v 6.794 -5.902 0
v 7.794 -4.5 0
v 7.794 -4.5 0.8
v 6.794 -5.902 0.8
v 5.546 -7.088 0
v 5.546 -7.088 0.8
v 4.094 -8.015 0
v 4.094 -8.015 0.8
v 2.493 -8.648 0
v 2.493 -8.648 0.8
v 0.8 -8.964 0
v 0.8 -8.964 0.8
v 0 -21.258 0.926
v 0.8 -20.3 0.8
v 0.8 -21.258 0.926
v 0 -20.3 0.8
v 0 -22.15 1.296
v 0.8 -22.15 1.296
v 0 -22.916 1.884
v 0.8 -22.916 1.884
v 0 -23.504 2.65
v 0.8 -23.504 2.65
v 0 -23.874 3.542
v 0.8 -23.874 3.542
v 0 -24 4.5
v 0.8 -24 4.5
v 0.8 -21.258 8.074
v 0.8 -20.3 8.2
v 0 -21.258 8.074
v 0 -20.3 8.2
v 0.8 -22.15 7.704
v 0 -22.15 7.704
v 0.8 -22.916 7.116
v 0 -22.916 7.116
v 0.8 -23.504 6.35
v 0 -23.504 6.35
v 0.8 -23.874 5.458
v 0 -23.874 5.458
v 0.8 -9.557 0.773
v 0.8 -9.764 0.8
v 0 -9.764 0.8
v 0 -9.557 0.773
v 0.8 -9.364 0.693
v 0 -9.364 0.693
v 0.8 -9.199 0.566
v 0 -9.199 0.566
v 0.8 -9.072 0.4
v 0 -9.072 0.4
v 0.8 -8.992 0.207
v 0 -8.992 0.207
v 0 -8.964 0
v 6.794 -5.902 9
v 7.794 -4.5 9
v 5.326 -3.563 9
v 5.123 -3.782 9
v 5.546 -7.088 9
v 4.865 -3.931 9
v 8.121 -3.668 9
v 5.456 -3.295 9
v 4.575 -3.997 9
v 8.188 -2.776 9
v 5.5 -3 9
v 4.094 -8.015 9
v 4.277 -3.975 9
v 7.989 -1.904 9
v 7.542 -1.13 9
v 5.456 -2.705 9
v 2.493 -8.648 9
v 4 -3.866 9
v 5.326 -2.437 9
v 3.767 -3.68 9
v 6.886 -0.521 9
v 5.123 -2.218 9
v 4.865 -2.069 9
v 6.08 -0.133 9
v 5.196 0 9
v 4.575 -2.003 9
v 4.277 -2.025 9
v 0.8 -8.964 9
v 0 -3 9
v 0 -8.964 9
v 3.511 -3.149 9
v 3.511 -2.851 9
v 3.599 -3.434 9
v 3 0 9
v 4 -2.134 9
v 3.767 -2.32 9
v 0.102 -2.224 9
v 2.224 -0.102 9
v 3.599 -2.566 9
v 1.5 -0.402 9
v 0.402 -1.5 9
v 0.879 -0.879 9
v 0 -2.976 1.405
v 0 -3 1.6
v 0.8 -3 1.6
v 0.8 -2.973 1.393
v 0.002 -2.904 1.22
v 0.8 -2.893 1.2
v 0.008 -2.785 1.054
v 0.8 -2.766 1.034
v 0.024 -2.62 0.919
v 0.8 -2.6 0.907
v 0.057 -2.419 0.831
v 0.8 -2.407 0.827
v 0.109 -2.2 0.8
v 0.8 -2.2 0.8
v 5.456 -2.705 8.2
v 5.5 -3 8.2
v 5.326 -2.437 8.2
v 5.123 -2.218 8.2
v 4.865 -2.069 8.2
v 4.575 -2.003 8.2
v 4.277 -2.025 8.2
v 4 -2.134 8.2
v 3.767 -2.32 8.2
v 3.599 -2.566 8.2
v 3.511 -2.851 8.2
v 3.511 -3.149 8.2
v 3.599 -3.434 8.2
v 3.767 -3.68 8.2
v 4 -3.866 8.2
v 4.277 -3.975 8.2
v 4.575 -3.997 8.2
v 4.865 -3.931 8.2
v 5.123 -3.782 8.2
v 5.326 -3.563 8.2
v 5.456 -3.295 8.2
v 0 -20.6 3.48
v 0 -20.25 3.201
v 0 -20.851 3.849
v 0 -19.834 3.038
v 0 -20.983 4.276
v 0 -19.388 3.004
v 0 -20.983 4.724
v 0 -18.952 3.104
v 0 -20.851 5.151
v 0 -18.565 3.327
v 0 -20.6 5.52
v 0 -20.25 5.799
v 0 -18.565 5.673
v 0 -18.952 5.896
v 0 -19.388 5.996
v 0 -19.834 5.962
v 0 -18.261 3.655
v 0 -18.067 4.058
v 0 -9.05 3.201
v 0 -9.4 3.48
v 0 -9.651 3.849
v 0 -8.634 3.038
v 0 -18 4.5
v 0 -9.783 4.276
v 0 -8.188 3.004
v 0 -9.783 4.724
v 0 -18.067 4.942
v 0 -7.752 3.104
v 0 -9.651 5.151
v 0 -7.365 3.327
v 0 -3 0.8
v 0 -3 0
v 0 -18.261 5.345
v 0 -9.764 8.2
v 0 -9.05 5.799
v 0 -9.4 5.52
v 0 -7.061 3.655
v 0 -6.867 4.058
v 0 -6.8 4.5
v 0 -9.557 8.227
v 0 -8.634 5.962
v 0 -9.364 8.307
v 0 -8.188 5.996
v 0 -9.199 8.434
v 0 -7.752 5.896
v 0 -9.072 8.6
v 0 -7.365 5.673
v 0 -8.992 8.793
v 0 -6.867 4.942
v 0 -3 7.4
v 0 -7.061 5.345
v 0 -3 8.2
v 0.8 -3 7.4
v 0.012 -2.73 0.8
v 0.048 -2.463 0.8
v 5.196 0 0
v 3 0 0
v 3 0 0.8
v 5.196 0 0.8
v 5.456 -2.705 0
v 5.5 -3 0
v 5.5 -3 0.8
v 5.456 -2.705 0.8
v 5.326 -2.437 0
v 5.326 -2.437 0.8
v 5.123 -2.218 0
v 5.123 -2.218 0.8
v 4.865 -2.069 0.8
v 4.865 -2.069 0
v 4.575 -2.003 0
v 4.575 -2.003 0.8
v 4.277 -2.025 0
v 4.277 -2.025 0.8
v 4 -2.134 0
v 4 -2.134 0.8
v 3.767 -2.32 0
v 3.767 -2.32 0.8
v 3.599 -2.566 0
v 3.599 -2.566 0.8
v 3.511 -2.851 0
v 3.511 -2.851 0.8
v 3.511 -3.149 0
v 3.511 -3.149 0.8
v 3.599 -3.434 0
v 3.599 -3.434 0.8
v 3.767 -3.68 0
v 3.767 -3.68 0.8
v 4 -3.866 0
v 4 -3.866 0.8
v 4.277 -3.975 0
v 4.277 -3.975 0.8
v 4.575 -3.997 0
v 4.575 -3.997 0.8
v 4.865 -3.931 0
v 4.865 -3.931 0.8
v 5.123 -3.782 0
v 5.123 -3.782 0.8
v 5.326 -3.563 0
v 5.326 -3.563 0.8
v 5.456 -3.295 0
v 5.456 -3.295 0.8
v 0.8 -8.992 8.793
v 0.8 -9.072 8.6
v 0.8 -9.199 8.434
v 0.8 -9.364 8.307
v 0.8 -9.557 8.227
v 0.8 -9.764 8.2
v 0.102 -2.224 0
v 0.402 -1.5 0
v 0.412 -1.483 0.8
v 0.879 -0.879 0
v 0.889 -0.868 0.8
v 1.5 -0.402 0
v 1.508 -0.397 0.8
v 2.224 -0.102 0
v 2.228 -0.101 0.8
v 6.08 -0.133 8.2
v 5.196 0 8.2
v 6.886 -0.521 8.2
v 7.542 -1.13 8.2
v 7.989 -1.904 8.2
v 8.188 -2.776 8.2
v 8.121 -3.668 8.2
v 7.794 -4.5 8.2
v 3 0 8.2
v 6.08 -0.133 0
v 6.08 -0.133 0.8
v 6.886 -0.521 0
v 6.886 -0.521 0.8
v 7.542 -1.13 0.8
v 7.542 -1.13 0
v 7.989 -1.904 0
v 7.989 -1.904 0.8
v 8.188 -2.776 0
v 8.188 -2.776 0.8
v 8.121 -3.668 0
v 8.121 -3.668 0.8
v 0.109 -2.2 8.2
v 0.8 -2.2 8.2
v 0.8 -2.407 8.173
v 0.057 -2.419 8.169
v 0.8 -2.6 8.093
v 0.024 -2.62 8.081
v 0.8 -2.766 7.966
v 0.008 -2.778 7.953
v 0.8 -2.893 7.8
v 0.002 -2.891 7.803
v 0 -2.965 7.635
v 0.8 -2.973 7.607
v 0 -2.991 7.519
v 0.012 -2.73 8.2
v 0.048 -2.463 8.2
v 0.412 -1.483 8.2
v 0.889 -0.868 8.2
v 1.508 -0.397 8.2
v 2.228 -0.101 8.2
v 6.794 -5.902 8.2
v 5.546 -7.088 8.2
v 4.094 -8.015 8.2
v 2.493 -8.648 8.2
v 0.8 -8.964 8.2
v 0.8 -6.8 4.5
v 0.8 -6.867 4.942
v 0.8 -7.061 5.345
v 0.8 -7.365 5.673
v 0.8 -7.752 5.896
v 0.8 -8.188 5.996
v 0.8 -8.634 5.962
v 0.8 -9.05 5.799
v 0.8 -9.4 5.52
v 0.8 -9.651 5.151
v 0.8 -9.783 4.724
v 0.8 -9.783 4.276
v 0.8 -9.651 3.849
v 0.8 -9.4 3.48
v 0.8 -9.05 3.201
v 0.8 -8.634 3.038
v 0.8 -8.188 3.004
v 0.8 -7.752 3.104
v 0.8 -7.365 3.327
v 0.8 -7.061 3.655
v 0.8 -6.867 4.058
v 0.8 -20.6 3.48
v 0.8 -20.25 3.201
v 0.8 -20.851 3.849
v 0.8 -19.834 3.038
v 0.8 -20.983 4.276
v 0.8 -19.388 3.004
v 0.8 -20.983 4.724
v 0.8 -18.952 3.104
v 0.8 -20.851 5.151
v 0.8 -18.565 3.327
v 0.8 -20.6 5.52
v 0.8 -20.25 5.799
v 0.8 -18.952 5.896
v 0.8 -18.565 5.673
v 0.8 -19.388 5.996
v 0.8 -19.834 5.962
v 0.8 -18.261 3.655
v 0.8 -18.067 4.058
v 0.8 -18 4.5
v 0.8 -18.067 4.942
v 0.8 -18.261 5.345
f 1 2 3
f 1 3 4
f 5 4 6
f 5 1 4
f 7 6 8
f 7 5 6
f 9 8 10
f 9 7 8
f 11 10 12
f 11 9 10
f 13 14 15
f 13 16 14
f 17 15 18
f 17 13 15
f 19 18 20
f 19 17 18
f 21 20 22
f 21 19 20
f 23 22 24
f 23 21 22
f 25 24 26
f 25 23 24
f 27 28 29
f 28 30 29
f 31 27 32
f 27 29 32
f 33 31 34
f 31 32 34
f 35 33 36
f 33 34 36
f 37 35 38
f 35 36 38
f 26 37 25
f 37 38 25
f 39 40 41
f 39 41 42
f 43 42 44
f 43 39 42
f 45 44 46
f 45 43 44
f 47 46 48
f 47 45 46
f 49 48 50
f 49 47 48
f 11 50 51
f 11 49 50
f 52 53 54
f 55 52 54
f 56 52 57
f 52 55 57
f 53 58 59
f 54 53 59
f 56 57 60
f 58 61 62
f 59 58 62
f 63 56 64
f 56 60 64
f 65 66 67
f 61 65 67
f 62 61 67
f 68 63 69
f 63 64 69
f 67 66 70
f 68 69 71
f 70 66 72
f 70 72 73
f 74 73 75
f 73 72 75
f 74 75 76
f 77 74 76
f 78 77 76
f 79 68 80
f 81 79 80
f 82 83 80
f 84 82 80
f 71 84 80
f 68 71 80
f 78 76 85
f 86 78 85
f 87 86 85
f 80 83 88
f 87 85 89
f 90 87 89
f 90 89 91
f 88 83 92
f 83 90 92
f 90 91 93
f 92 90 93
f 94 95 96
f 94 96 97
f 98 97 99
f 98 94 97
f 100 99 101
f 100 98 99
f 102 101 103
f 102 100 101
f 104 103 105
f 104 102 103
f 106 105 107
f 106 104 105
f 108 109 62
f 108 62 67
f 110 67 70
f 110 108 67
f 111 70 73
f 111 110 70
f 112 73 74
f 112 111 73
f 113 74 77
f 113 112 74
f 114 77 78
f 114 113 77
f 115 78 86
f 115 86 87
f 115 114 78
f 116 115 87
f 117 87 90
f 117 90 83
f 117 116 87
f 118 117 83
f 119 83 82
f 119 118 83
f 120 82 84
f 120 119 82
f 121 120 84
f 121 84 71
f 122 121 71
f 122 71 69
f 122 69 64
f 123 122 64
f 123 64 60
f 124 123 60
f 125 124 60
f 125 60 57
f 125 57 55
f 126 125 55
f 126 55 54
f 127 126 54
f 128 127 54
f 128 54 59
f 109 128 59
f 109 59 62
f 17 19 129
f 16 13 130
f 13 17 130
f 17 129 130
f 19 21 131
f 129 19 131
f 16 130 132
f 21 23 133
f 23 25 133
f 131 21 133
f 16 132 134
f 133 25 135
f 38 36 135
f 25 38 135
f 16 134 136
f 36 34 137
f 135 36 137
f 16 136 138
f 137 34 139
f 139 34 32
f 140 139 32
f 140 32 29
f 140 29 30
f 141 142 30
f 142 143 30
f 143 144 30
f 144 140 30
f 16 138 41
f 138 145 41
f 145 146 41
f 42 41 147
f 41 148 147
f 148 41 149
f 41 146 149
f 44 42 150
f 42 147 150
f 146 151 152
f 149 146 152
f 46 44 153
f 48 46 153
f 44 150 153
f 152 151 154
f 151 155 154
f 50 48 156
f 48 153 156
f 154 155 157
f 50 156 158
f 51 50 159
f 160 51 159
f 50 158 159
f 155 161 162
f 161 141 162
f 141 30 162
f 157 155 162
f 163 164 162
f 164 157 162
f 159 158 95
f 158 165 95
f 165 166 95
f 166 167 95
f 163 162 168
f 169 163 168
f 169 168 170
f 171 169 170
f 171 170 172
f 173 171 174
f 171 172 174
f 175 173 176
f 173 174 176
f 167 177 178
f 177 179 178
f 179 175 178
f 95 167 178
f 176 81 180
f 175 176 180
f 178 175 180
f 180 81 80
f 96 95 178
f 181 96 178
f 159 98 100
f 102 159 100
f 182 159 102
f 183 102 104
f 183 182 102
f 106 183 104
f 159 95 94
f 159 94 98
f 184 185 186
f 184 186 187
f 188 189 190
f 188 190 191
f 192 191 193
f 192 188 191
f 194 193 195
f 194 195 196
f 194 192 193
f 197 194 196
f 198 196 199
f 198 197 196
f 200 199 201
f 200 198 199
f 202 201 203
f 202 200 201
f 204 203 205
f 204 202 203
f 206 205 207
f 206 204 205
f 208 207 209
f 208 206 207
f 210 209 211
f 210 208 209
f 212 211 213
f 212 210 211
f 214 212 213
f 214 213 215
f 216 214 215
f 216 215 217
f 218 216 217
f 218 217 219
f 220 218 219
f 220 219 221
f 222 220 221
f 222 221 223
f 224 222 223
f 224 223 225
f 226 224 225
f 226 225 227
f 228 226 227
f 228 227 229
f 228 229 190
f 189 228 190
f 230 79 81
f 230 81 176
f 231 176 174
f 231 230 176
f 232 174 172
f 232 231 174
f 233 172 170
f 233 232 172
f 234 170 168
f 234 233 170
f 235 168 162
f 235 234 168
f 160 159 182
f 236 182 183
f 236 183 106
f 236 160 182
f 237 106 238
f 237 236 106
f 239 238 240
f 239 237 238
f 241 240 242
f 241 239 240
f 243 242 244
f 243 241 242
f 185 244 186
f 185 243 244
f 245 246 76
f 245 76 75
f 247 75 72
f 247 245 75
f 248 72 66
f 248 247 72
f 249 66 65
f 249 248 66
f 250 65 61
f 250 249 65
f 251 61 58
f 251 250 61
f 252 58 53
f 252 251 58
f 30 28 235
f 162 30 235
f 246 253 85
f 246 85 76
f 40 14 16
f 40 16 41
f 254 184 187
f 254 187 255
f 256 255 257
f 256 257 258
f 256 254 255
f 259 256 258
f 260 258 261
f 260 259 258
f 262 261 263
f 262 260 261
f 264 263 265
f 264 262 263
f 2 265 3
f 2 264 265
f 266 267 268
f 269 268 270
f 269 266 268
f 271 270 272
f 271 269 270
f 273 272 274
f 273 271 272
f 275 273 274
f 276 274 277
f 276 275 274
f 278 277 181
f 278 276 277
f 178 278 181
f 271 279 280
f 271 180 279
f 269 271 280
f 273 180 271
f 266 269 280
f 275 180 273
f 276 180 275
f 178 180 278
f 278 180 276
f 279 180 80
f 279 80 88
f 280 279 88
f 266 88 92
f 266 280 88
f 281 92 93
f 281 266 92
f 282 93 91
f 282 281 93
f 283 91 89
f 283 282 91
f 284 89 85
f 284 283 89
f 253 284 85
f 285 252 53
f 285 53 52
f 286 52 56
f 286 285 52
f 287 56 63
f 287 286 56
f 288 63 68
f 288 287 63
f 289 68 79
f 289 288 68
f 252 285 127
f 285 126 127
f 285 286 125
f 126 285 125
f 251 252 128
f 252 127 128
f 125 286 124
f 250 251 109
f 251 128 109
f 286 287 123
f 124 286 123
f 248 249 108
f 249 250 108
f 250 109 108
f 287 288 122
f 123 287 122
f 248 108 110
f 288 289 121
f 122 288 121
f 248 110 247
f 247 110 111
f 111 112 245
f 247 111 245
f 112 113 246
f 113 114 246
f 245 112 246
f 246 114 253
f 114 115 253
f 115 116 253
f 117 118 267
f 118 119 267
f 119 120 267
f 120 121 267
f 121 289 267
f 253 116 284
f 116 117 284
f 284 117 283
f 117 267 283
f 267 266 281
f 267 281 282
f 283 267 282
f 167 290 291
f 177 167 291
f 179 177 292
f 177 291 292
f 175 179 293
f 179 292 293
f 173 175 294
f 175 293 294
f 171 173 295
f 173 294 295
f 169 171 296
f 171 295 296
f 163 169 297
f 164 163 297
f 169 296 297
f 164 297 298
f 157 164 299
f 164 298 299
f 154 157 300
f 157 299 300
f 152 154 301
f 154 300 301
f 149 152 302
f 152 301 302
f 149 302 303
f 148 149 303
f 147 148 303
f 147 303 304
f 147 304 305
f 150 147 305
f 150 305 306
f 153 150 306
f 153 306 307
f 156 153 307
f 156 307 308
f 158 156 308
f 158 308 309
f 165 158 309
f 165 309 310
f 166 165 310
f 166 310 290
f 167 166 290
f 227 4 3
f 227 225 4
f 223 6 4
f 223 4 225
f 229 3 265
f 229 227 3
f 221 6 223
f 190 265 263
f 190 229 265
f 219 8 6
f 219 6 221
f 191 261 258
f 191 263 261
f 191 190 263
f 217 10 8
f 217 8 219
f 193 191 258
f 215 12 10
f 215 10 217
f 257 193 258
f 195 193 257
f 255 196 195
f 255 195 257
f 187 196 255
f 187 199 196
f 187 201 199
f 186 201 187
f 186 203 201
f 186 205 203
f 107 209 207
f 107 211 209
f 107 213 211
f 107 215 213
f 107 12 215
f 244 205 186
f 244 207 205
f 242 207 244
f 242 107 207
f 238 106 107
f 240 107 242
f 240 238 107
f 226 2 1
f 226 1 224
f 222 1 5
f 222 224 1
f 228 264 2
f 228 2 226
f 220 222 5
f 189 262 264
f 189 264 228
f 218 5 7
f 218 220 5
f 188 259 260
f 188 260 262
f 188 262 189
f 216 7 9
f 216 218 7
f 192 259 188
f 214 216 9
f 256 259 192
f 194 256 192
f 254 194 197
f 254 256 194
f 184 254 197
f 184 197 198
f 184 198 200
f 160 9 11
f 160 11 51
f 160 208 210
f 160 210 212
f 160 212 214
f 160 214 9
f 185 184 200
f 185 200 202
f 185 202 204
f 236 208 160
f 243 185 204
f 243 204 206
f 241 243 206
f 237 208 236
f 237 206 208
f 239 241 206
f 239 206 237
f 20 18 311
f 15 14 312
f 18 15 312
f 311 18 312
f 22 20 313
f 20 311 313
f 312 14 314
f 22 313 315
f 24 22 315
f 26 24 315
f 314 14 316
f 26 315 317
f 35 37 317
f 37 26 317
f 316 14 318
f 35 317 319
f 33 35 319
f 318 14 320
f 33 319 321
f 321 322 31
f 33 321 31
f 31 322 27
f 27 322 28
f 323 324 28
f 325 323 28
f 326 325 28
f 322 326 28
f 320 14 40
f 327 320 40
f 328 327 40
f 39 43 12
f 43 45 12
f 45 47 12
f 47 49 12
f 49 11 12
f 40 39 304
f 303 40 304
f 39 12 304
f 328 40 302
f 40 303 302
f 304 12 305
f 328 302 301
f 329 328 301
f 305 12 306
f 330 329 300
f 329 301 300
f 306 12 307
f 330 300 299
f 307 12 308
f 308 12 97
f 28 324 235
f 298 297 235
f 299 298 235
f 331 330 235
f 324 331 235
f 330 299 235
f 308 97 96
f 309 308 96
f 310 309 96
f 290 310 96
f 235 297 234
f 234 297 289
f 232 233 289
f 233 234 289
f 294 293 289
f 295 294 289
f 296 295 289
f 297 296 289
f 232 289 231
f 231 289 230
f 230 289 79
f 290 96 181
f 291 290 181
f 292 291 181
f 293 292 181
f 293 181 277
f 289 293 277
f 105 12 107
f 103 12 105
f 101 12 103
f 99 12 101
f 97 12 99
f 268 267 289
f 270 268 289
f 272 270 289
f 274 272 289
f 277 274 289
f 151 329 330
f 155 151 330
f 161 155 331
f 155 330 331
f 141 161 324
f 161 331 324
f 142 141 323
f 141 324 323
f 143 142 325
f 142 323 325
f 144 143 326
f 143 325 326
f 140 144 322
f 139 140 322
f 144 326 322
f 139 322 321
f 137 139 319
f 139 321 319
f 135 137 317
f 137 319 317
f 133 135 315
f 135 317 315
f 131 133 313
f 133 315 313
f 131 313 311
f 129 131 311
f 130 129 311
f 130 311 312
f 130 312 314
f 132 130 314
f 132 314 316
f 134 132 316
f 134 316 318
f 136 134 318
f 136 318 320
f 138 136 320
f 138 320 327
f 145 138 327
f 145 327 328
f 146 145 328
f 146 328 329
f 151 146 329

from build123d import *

# Parameters (mm, degrees)
SKETCH_1_R          = 1
EXTRUDE_1_DEPTH     = 9
SKETCH_2_W          = 7.4
SKETCH_2_H          = 10
CUT_EXTRUDE_1_DEPTH = 9
SKETCH_3_W          = 0.8
SKETCH_3_H          = 15.035626068
CUT_EXTRUDE_2_DEPTH = 9
FILLET_2_R          = 3.7
SKETCH_4_W          = 7.4
SKETCH_4_H          = 2.039607805
CUT_EXTRUDE_3_DEPTH = 9
SKETCH_5_R          = 1.5
CUT_EXTRUDE_4_DEPTH = 9
FILLET_3_R          = 0.8


# Some blends are built 0.0001 mm under size
with BuildPart() as part:
    # 草图1 → 凸台-拉伸1 (new body)
    with BuildSketch(Plane.XY):
        with BuildLine():
            Line((3, 0), (5.196152423, 0))
            ThreePointArc((5.196152423, 0), (7.794228634, -1.5), (7.794228634, -4.5))
            ThreePointArc((7.794228634, -4.5), (4.842298019, -7.586313327), (0.8, -8.964373932))
            Line((0.8, -8.964373932), (0.8, -24))
            Line((0.8, -24), (0, -24))
            Line((0, -24), (0, -3))
            ThreePointArc((0, -3), (0.878679656, -0.878679656), (3, 0))
        make_face()
        with Locations((4.5, -3)):
            Circle(SKETCH_1_R, mode=Mode.SUBTRACT)
    extrude(amount=EXTRUDE_1_DEPTH)

    # 草图2 → 切除-拉伸1 (cut)
    with BuildSketch(Plane(origin=(0.8, 0, 0), x_dir=(0, 0, -1), z_dir=(1, 0, 0))):
        with Locations((-4.5, -3.964373932)):
            Rectangle(SKETCH_2_W, SKETCH_2_H)
    extrude(amount=CUT_EXTRUDE_1_DEPTH, mode=Mode.SUBTRACT)

    # 草图3 → 切除-拉伸2 (cut)
    with BuildSketch(Plane(origin=(0.8, 0, 0), x_dir=(0, 0, -1), z_dir=(1, 0, 0))):
        with Locations((-8.6, -16.482186966)):
            Rectangle(SKETCH_3_W, SKETCH_3_H)
        with Locations((-0.4, -16.482186966)):
            Rectangle(SKETCH_3_W, SKETCH_3_H)
    extrude(amount=-CUT_EXTRUDE_2_DEPTH, mode=Mode.SUBTRACT)

    # 圆角2
    fillet_2_edges = [part.edges().sort_by_distance(p)[0] for p in [
        (0.4, -24, 0.8),
        (0.4, -24, 8.2),
    ]]
    fillet(fillet_2_edges, radius=FILLET_2_R - 0.0001)  # a hair under: the kernel refuses the full size

    # 草图4 → 切除-拉伸3 (cut)
    with BuildSketch(Plane.ZY):
        with Locations((4.5, -1.980196097)):
            Rectangle(SKETCH_4_W, SKETCH_4_H)
    extrude(amount=-CUT_EXTRUDE_3_DEPTH, mode=Mode.SUBTRACT)

    # 草图5 → 切除-拉伸4 (cut)
    with BuildSketch(Plane(origin=(0.8, 0, 0), x_dir=(0, 0, -1), z_dir=(1, 0, 0))):
        with Locations(Location((-4.5, -8.3, 0), (0, 0, 90))):
            Circle(SKETCH_5_R)
        with Locations(Location((-4.5, -19.5, 0), (0, 0, 90))):
            Circle(SKETCH_5_R)
    extrude(amount=-CUT_EXTRUDE_4_DEPTH, mode=Mode.SUBTRACT)

    # 圆角3
    # the kernel refuses this fillet: 0.8 mm, written as the material it adds along each edge
    with BuildSketch(Plane(origin=(0.8, -8.964373932, 0.8), x_dir=(0, -1, 0), z_dir=(-1, 0, 0))) as fillet_3_piece_1:
        with BuildLine():
            CenterArc((FILLET_3_R, -FILLET_3_R), FILLET_3_R, 90, 90)
            Line((0, -FILLET_3_R), (0, 0))
            Line((0, 0), (FILLET_3_R, 0))
        make_face()
    extrude(amount=0.8)
    with BuildSketch(Plane(origin=(0.8, -8.964373932, 8.2), x_dir=(0, -1, 0), z_dir=(-1, 0, 0))) as fillet_3_piece_2:
        with BuildLine():
            CenterArc((FILLET_3_R, FILLET_3_R), FILLET_3_R, 180, 90)
            Line((0, FILLET_3_R), (0, 0))
            Line((0, 0), (FILLET_3_R, 0))
        make_face()
    extrude(amount=0.8)
    with BuildSketch(Plane(origin=(-2, -3, 0.8), x_dir=(0, 0, 1), z_dir=(1, 0, 0))) as fillet_3_piece_3_section:
        with BuildLine():
            CenterArc((FILLET_3_R, -FILLET_3_R), FILLET_3_R, 90, 90)
            Line((0, -FILLET_3_R), (0, 0))
            Line((0, 0), (FILLET_3_R, 0))
        make_face()
    fillet_3_piece_3 = extrude(amount=2.8, mode=Mode.PRIVATE)
    fillet_3_piece_3 = fillet_3_piece_3 & Plane(origin=(3, -3, 0.979954946), x_dir=(-1, 0, 0), z_dir=(0, 0, -1)) * Cylinder(3, 9, mode=Mode.PRIVATE)
    add(fillet_3_piece_3)
    with BuildSketch(Plane(origin=(-2, -3, 8.2), x_dir=(0, 0, -1), z_dir=(1, 0, 0))) as fillet_3_piece_4_section:
        with BuildLine():
            CenterArc((FILLET_3_R, FILLET_3_R), FILLET_3_R, 180, 90)
            Line((0, FILLET_3_R), (0, 0))
            Line((0, 0), (FILLET_3_R, 0))
        make_face()
    fillet_3_piece_4 = extrude(amount=2.8, mode=Mode.PRIVATE)
    fillet_3_piece_4 = fillet_3_piece_4 & Plane(origin=(3, -3, 8.020045054), x_dir=(-1, 0, 0), z_dir=(0, 0, -1)) * Cylinder(3, 9, mode=Mode.PRIVATE)
    add(fillet_3_piece_4)


solid = part.part
